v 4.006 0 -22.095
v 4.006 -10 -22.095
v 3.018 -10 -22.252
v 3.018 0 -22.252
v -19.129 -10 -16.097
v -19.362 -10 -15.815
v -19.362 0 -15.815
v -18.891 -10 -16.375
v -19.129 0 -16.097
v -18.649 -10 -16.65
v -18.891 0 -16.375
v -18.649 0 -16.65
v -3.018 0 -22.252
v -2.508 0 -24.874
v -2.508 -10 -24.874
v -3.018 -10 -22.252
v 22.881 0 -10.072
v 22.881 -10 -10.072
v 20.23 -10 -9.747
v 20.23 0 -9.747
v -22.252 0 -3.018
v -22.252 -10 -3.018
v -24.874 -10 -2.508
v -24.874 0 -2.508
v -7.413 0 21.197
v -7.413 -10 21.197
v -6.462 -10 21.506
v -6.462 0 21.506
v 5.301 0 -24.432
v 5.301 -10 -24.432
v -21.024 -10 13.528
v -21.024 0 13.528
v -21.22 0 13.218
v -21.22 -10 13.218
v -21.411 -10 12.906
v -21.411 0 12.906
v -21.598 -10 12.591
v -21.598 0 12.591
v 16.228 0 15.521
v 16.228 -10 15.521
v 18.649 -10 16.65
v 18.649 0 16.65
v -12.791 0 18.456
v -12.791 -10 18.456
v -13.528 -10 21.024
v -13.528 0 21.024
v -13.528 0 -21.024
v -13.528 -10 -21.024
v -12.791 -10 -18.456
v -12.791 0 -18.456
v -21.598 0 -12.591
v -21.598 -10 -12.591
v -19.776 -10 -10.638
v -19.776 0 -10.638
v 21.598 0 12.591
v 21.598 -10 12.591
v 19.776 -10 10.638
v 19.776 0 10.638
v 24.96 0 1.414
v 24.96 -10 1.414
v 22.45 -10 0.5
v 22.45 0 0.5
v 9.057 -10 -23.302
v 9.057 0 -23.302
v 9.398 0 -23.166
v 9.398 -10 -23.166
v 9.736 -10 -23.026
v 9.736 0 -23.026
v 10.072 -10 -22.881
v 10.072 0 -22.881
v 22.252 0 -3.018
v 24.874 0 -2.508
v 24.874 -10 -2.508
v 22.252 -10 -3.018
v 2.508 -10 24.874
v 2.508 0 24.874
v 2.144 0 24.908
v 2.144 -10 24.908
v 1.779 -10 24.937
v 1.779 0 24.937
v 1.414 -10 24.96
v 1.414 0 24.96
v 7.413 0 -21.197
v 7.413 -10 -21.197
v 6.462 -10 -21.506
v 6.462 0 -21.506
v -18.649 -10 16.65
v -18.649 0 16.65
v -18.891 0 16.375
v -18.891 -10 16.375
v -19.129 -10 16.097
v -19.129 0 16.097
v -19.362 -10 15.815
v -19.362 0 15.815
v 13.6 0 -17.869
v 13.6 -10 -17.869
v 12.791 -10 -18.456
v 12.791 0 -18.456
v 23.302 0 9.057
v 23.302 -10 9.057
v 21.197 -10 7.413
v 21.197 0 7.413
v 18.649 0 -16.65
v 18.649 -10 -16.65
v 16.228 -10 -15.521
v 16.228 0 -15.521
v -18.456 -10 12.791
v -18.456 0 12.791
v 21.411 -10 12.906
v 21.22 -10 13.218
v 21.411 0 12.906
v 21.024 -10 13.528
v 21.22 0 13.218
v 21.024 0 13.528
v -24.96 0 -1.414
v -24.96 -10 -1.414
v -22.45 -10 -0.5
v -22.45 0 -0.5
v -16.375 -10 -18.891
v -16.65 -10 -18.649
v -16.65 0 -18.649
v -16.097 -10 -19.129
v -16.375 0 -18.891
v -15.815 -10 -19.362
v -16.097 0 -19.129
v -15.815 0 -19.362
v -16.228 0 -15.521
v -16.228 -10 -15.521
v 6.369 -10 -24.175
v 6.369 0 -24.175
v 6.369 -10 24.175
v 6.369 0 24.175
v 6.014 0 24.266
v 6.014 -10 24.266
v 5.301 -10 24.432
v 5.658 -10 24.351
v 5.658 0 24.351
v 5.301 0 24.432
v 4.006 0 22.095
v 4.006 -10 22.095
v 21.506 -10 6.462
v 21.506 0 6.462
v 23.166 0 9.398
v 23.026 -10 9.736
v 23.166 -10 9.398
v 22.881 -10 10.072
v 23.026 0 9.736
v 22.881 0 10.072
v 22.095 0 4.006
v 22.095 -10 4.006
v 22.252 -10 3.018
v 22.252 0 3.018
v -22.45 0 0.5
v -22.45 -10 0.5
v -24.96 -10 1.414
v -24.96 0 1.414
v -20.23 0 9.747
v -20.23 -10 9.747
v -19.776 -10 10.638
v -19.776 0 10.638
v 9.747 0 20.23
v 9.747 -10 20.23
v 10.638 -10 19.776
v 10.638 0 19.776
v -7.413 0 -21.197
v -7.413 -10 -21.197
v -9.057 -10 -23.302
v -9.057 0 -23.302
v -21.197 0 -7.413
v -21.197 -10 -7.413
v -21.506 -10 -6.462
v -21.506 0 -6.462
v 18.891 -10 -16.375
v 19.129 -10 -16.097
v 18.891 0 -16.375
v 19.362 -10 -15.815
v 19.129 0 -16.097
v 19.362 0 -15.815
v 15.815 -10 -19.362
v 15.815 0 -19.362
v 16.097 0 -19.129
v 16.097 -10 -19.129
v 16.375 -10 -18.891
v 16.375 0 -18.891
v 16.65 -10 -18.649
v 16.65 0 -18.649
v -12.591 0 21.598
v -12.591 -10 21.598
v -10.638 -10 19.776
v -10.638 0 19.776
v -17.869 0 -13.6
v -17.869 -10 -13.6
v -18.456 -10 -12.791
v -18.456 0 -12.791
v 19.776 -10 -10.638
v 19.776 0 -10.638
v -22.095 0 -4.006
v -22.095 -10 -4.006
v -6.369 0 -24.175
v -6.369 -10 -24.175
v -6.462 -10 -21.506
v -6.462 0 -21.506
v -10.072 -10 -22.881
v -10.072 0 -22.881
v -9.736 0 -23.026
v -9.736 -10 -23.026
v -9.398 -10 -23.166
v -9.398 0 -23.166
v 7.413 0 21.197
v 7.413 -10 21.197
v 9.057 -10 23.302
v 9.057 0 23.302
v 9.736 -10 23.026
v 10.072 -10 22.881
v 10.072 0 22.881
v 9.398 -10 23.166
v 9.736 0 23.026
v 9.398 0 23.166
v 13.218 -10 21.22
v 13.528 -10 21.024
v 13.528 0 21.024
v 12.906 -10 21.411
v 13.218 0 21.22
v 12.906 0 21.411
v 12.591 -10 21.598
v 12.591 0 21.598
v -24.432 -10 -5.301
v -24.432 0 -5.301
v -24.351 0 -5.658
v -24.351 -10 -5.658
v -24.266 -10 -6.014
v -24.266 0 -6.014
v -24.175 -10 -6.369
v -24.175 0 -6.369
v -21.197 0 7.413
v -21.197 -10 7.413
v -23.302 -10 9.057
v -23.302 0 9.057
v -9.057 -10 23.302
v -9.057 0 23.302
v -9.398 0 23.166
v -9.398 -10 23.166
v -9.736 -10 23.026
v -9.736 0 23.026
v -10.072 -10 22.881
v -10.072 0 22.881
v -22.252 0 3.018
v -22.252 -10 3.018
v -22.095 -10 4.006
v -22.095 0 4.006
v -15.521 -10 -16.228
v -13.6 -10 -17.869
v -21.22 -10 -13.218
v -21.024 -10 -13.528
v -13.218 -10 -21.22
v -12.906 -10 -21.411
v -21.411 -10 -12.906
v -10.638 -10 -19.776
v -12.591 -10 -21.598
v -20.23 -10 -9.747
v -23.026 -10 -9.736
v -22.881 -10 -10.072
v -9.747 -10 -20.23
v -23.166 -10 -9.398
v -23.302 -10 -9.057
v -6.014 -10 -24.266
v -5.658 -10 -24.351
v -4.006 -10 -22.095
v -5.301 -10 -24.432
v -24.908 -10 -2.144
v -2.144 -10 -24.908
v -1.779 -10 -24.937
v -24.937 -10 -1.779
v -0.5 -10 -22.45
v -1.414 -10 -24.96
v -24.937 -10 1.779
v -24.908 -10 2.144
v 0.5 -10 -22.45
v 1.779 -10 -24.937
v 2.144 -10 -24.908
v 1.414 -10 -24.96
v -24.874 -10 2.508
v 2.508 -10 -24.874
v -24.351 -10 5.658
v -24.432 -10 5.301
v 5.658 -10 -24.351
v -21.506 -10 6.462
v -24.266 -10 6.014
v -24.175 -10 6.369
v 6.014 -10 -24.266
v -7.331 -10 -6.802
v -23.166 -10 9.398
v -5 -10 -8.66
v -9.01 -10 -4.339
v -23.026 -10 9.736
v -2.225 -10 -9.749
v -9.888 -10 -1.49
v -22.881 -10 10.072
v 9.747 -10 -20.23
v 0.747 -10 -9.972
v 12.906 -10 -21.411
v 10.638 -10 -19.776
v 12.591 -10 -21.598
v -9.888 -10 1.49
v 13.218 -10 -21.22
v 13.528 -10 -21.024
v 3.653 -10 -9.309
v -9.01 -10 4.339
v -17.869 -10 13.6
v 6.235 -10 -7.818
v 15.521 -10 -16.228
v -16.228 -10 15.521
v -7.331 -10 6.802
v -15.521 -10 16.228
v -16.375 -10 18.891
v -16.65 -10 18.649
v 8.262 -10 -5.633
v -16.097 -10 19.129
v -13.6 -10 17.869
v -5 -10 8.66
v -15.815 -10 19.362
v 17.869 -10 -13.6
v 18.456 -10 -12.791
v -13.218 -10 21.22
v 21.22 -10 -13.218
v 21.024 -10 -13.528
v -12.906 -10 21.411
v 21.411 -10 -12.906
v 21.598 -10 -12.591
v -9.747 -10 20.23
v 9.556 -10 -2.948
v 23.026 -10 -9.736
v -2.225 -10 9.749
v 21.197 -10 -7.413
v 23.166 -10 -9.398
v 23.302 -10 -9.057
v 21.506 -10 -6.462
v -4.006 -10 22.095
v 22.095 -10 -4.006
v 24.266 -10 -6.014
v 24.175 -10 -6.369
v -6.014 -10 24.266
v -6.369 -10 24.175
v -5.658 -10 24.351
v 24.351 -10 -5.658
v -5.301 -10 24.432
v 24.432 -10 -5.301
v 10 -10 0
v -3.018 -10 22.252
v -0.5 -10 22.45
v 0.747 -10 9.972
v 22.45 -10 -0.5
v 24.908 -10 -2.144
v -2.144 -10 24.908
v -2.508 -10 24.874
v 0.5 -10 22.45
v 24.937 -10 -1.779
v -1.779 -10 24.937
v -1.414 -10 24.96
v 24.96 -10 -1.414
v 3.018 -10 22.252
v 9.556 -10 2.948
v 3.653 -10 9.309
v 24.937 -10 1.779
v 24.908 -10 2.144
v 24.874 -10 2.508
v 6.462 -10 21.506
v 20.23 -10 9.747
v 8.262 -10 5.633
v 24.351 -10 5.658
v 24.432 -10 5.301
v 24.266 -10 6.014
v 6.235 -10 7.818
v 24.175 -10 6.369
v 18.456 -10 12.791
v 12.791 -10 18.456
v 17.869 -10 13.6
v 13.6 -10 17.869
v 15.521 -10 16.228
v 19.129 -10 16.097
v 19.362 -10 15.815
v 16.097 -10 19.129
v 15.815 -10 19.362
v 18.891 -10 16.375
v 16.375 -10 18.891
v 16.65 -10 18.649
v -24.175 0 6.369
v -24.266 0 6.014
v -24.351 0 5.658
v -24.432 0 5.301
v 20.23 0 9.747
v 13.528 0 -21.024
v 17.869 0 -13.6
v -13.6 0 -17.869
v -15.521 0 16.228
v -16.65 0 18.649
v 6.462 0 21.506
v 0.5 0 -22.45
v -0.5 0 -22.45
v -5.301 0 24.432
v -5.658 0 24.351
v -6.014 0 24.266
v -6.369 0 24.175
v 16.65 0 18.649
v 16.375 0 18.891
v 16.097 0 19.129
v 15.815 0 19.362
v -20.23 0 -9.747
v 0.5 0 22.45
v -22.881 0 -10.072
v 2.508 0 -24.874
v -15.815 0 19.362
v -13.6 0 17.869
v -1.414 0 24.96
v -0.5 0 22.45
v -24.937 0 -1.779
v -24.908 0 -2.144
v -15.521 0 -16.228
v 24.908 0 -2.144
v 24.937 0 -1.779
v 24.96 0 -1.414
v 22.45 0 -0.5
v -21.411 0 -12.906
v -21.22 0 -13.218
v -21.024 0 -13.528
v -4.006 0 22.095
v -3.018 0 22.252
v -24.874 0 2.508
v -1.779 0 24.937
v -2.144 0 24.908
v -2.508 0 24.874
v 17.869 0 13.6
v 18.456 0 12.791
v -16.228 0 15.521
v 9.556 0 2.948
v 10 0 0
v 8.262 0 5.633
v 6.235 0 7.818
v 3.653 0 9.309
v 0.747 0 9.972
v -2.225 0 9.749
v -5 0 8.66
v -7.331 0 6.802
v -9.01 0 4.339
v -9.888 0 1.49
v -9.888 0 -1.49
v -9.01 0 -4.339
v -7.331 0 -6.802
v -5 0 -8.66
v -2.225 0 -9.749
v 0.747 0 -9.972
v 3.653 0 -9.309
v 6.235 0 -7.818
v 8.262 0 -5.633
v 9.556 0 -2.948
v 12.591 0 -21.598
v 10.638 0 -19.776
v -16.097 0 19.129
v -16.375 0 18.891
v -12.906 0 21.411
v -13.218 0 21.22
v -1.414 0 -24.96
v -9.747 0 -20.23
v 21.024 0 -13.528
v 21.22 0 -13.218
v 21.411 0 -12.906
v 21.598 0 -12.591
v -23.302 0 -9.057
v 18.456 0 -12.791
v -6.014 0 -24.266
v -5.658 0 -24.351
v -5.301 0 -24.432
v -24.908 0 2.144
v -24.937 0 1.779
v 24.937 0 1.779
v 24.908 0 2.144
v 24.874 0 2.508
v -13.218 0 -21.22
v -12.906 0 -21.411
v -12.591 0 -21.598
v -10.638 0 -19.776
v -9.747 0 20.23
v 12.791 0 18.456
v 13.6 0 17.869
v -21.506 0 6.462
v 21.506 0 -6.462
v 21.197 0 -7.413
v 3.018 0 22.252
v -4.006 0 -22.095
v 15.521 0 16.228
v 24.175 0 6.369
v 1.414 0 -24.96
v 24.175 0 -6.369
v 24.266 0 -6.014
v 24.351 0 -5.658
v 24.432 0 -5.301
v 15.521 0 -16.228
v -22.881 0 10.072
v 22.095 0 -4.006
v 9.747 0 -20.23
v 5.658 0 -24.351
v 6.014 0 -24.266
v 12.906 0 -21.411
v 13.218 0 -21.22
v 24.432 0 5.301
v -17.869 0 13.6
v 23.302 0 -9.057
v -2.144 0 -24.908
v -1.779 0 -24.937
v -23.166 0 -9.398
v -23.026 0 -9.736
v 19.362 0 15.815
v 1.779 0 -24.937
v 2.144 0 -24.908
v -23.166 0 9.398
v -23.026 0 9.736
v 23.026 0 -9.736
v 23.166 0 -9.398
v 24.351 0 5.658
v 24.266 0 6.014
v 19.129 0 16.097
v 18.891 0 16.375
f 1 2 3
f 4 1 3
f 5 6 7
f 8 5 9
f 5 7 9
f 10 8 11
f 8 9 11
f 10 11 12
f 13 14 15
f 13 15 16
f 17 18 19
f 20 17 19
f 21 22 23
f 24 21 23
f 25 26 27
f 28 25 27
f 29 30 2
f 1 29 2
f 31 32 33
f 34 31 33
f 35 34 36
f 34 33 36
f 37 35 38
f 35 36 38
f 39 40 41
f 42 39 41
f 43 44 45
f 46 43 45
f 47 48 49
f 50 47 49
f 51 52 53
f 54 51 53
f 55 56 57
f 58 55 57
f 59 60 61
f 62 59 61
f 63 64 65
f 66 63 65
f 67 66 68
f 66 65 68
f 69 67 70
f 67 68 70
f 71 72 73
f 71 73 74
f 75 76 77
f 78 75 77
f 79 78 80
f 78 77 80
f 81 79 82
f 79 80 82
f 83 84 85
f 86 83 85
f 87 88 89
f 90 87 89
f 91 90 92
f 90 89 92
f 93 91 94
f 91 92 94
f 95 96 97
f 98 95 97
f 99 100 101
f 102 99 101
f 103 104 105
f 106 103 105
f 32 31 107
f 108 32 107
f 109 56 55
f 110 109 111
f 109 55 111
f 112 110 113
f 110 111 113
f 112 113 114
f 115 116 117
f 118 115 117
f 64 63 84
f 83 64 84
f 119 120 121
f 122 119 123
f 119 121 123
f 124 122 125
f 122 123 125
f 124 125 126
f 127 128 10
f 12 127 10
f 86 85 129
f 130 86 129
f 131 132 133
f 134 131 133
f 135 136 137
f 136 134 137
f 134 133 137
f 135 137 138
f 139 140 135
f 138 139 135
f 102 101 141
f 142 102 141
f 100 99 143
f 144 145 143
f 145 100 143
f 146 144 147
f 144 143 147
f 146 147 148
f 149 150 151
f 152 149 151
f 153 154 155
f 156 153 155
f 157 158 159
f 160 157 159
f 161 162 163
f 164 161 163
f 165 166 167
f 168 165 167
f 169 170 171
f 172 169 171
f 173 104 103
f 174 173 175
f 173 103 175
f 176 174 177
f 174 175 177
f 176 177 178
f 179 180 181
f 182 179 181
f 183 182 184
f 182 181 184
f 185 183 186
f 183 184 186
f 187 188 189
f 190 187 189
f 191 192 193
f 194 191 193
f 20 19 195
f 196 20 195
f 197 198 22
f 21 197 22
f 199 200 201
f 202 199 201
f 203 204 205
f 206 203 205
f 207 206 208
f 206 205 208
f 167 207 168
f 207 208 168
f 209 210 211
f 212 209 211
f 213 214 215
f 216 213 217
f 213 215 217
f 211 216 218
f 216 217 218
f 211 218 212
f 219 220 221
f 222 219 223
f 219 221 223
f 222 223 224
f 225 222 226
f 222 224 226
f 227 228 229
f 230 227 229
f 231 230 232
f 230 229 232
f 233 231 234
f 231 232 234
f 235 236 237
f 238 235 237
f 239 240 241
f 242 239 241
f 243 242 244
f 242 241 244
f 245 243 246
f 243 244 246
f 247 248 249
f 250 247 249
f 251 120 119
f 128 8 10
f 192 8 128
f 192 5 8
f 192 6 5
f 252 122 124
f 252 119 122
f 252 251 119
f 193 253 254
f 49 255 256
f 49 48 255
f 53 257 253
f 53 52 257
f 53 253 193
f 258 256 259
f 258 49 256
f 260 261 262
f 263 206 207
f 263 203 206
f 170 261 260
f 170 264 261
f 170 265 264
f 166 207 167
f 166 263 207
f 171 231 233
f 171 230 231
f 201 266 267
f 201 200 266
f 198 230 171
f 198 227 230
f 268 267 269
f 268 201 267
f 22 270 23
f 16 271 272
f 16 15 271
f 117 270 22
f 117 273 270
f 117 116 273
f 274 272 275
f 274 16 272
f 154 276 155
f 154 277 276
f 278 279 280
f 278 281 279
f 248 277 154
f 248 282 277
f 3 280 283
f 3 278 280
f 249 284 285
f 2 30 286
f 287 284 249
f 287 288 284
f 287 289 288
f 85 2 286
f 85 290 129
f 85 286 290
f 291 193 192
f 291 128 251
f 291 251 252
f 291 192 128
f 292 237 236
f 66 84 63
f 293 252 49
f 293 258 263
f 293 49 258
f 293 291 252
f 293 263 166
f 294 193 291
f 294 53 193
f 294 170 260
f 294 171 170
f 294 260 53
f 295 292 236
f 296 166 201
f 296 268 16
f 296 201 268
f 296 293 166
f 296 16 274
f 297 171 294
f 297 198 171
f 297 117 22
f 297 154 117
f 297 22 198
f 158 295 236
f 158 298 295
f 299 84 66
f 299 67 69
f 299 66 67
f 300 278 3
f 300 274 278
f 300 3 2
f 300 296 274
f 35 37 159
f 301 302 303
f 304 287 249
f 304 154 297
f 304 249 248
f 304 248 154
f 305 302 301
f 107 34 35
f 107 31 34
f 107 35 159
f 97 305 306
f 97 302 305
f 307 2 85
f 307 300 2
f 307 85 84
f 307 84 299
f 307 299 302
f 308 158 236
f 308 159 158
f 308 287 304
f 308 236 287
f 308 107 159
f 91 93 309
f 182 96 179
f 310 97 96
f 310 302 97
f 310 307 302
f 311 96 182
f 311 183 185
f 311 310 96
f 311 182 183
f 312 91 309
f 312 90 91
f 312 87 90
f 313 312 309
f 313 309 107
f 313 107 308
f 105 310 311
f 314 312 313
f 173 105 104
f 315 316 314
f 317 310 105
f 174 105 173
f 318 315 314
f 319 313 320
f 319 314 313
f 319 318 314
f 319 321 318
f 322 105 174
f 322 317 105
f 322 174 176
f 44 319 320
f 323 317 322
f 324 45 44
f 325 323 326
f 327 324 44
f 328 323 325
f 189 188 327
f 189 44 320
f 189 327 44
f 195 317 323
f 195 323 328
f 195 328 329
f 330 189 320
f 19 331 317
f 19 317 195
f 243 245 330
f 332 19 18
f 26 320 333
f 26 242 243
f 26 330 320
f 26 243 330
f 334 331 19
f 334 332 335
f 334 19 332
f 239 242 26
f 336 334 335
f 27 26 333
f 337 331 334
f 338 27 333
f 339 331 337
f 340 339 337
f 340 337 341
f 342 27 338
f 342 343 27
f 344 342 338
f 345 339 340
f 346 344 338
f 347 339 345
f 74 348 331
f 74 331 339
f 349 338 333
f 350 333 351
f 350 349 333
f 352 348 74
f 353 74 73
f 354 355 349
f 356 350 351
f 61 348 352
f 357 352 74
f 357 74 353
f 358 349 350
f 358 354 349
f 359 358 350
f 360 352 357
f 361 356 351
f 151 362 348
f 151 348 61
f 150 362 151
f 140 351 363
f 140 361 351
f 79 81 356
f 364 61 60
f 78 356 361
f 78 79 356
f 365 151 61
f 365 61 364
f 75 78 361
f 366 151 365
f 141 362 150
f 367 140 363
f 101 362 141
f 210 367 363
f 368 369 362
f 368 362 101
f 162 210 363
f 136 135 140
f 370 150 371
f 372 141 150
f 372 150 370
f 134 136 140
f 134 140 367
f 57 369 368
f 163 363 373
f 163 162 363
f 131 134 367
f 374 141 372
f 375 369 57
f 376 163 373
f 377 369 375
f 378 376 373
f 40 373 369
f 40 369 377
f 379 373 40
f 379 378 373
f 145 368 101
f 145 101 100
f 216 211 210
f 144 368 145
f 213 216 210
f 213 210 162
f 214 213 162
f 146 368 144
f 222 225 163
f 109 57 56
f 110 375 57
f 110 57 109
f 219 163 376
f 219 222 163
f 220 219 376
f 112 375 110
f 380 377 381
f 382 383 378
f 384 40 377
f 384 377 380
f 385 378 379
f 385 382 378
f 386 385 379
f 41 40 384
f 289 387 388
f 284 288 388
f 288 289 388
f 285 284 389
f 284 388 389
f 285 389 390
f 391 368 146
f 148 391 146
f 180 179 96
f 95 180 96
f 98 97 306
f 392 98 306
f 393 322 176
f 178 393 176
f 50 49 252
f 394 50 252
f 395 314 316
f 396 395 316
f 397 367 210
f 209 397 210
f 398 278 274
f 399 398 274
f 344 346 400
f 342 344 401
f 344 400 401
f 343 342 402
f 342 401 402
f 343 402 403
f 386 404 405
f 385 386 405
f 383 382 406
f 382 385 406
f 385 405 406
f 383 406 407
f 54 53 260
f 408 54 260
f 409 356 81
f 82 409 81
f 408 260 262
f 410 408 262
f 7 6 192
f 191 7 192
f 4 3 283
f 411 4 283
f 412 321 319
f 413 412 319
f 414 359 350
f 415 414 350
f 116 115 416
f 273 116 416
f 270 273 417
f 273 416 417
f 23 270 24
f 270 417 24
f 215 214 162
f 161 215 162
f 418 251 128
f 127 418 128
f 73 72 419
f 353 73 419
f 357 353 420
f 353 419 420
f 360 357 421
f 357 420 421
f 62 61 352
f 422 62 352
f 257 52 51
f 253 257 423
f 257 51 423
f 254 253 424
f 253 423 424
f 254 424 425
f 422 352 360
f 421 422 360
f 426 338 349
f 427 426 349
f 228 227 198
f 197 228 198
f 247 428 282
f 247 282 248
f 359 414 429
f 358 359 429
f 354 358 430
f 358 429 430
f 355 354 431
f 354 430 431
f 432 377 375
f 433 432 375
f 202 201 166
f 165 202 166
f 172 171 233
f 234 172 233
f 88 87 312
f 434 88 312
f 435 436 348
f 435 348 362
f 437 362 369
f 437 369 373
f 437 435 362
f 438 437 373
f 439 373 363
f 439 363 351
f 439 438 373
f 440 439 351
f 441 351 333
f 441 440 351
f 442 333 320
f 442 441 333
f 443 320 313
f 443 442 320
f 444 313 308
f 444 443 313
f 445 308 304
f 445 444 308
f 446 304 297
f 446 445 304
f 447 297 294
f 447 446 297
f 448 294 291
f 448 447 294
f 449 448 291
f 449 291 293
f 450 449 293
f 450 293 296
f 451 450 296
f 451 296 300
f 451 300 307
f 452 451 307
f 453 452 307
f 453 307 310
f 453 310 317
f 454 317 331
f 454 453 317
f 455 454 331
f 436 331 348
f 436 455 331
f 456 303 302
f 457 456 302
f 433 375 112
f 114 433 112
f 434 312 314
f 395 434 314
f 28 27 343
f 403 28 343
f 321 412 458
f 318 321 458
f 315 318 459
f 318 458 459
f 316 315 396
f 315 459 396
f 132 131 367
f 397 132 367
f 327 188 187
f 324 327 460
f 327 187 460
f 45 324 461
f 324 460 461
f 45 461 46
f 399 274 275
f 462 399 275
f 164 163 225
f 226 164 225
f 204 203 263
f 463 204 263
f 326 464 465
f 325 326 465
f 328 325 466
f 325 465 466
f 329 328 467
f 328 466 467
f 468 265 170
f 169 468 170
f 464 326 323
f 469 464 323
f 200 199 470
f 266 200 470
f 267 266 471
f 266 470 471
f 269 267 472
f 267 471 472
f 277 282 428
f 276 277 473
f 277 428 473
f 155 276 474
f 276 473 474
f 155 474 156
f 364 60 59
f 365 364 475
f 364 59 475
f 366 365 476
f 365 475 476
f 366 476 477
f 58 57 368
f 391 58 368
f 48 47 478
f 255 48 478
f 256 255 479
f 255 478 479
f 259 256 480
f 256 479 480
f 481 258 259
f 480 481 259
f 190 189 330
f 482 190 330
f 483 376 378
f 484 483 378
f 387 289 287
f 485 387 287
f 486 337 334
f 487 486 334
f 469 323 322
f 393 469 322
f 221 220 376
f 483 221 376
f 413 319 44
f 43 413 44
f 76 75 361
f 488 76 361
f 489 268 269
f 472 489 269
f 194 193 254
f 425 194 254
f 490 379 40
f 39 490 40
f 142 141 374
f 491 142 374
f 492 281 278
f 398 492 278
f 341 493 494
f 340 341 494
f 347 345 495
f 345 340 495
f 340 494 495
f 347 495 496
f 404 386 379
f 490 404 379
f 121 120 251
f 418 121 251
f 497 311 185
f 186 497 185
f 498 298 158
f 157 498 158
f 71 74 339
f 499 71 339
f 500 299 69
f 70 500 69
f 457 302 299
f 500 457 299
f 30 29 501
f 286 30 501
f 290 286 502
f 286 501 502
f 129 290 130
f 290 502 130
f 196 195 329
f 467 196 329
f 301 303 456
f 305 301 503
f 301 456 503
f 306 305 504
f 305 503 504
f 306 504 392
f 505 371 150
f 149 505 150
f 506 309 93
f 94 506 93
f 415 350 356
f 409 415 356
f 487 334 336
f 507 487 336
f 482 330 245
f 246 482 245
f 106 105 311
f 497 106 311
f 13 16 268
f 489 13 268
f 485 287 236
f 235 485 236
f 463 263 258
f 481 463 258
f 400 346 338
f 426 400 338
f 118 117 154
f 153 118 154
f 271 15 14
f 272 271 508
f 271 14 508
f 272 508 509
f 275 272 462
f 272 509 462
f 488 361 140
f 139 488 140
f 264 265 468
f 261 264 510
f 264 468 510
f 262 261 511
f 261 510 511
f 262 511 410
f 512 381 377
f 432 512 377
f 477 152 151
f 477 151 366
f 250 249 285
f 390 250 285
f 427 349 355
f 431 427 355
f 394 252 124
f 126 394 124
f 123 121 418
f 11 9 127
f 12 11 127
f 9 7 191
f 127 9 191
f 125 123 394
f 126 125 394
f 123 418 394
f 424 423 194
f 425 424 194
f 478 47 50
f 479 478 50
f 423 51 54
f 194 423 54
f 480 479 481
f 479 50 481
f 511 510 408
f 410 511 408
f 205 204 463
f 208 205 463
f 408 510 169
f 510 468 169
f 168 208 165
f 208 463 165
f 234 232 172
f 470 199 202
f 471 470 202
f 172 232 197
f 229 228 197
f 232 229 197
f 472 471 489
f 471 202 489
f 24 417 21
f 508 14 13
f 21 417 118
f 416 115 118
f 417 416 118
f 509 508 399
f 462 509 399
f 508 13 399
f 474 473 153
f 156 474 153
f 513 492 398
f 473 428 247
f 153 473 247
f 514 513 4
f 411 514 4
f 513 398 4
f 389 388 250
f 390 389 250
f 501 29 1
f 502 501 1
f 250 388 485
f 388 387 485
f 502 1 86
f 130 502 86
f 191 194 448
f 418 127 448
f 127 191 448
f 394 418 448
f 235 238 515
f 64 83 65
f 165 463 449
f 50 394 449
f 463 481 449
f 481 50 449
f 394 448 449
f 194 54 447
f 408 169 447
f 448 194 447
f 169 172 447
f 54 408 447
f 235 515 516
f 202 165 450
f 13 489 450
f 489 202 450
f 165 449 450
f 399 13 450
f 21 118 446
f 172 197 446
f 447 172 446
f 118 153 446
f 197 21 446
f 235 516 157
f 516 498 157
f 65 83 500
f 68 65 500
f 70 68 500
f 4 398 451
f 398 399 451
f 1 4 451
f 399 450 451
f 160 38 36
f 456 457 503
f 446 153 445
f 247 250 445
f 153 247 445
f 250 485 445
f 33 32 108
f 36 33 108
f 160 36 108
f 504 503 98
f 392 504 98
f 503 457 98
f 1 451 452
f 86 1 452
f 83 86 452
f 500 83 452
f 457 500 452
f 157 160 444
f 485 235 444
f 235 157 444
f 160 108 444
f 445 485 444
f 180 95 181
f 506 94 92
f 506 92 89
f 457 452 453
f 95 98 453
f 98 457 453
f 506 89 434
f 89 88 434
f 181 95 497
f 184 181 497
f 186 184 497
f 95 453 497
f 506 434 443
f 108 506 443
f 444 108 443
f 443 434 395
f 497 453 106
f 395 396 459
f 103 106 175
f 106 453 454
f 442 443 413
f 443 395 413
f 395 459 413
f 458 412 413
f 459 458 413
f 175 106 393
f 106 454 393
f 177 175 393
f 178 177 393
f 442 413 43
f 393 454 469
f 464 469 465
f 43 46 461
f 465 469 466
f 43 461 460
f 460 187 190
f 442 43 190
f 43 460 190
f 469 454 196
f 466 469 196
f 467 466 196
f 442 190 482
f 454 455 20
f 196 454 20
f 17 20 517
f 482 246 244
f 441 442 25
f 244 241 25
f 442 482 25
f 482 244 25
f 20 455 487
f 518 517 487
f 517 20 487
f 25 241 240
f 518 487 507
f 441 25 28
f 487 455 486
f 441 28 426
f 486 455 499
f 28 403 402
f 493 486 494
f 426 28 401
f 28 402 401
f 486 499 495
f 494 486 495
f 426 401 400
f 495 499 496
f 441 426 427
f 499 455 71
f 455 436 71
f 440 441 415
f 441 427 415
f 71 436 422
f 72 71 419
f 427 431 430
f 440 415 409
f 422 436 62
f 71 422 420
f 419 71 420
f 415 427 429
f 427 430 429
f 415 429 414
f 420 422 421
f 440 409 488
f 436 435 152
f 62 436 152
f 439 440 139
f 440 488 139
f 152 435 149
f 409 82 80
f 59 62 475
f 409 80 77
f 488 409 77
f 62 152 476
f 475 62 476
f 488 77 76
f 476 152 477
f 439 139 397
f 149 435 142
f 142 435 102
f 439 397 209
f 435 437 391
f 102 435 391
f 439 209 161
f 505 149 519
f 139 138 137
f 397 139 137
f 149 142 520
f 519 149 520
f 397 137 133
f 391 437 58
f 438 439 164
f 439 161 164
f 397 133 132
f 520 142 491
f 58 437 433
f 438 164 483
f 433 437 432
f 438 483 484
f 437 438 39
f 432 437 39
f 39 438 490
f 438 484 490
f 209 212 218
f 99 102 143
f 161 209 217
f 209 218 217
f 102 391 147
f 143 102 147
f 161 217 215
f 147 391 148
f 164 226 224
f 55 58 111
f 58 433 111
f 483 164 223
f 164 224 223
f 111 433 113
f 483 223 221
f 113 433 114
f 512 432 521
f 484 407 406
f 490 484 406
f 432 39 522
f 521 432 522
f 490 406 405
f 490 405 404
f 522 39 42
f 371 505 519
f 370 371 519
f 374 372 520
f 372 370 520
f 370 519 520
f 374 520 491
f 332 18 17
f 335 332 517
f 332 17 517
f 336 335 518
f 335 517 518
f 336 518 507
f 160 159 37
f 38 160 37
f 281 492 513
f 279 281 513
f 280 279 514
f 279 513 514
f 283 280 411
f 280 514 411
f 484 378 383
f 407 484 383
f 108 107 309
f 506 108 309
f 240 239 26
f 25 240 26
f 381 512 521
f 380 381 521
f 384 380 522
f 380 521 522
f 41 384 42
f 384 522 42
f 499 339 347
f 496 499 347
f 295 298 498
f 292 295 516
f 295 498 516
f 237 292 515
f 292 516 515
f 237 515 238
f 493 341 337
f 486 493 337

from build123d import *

# Parameters (mm, degrees)
F0_R     = 25
F0_R_2   = 10
F1_DEPTH = 10
F3_DEPTH = 25
F4_COUNT = 40


with BuildPart() as f1:
    # F0 (on Front) → F1 (new body)
    with BuildSketch(Plane.XZ):
        Circle(F0_R)
        Circle(F0_R_2, mode=Mode.SUBTRACT)
    extrude(amount=F1_DEPTH)

    # F2 (on face) → F3 (cut)
    with BuildSketch(Plane.XZ.offset(10)):
        with BuildLine():
            Line((-0.5, 22.45), (0, 22.45))
            Line((0, 22.45), (0.5, 22.45))
            Line((0.5, 22.45), (1.4135669538, 24.9600045767))
            ThreePointArc((1.4135669538, 24.9600045767), (0, 25), (-1.4135669538, 24.9600045767))
            Line((-1.4135669538, 24.9600045767), (-0.5, 22.45))
        make_face()
    f3 = extrude(amount=-F3_DEPTH, mode=Mode.SUBTRACT)

    # F4: F3 ×40 about axis
    f4_axis = Axis((0, 0, 0), (0, 1, 0))
    for i in range(1, F4_COUNT):
        add(f3.rotate(f4_axis, i * 360 / F4_COUNT), mode=Mode.SUBTRACT)


solid = f1.part
